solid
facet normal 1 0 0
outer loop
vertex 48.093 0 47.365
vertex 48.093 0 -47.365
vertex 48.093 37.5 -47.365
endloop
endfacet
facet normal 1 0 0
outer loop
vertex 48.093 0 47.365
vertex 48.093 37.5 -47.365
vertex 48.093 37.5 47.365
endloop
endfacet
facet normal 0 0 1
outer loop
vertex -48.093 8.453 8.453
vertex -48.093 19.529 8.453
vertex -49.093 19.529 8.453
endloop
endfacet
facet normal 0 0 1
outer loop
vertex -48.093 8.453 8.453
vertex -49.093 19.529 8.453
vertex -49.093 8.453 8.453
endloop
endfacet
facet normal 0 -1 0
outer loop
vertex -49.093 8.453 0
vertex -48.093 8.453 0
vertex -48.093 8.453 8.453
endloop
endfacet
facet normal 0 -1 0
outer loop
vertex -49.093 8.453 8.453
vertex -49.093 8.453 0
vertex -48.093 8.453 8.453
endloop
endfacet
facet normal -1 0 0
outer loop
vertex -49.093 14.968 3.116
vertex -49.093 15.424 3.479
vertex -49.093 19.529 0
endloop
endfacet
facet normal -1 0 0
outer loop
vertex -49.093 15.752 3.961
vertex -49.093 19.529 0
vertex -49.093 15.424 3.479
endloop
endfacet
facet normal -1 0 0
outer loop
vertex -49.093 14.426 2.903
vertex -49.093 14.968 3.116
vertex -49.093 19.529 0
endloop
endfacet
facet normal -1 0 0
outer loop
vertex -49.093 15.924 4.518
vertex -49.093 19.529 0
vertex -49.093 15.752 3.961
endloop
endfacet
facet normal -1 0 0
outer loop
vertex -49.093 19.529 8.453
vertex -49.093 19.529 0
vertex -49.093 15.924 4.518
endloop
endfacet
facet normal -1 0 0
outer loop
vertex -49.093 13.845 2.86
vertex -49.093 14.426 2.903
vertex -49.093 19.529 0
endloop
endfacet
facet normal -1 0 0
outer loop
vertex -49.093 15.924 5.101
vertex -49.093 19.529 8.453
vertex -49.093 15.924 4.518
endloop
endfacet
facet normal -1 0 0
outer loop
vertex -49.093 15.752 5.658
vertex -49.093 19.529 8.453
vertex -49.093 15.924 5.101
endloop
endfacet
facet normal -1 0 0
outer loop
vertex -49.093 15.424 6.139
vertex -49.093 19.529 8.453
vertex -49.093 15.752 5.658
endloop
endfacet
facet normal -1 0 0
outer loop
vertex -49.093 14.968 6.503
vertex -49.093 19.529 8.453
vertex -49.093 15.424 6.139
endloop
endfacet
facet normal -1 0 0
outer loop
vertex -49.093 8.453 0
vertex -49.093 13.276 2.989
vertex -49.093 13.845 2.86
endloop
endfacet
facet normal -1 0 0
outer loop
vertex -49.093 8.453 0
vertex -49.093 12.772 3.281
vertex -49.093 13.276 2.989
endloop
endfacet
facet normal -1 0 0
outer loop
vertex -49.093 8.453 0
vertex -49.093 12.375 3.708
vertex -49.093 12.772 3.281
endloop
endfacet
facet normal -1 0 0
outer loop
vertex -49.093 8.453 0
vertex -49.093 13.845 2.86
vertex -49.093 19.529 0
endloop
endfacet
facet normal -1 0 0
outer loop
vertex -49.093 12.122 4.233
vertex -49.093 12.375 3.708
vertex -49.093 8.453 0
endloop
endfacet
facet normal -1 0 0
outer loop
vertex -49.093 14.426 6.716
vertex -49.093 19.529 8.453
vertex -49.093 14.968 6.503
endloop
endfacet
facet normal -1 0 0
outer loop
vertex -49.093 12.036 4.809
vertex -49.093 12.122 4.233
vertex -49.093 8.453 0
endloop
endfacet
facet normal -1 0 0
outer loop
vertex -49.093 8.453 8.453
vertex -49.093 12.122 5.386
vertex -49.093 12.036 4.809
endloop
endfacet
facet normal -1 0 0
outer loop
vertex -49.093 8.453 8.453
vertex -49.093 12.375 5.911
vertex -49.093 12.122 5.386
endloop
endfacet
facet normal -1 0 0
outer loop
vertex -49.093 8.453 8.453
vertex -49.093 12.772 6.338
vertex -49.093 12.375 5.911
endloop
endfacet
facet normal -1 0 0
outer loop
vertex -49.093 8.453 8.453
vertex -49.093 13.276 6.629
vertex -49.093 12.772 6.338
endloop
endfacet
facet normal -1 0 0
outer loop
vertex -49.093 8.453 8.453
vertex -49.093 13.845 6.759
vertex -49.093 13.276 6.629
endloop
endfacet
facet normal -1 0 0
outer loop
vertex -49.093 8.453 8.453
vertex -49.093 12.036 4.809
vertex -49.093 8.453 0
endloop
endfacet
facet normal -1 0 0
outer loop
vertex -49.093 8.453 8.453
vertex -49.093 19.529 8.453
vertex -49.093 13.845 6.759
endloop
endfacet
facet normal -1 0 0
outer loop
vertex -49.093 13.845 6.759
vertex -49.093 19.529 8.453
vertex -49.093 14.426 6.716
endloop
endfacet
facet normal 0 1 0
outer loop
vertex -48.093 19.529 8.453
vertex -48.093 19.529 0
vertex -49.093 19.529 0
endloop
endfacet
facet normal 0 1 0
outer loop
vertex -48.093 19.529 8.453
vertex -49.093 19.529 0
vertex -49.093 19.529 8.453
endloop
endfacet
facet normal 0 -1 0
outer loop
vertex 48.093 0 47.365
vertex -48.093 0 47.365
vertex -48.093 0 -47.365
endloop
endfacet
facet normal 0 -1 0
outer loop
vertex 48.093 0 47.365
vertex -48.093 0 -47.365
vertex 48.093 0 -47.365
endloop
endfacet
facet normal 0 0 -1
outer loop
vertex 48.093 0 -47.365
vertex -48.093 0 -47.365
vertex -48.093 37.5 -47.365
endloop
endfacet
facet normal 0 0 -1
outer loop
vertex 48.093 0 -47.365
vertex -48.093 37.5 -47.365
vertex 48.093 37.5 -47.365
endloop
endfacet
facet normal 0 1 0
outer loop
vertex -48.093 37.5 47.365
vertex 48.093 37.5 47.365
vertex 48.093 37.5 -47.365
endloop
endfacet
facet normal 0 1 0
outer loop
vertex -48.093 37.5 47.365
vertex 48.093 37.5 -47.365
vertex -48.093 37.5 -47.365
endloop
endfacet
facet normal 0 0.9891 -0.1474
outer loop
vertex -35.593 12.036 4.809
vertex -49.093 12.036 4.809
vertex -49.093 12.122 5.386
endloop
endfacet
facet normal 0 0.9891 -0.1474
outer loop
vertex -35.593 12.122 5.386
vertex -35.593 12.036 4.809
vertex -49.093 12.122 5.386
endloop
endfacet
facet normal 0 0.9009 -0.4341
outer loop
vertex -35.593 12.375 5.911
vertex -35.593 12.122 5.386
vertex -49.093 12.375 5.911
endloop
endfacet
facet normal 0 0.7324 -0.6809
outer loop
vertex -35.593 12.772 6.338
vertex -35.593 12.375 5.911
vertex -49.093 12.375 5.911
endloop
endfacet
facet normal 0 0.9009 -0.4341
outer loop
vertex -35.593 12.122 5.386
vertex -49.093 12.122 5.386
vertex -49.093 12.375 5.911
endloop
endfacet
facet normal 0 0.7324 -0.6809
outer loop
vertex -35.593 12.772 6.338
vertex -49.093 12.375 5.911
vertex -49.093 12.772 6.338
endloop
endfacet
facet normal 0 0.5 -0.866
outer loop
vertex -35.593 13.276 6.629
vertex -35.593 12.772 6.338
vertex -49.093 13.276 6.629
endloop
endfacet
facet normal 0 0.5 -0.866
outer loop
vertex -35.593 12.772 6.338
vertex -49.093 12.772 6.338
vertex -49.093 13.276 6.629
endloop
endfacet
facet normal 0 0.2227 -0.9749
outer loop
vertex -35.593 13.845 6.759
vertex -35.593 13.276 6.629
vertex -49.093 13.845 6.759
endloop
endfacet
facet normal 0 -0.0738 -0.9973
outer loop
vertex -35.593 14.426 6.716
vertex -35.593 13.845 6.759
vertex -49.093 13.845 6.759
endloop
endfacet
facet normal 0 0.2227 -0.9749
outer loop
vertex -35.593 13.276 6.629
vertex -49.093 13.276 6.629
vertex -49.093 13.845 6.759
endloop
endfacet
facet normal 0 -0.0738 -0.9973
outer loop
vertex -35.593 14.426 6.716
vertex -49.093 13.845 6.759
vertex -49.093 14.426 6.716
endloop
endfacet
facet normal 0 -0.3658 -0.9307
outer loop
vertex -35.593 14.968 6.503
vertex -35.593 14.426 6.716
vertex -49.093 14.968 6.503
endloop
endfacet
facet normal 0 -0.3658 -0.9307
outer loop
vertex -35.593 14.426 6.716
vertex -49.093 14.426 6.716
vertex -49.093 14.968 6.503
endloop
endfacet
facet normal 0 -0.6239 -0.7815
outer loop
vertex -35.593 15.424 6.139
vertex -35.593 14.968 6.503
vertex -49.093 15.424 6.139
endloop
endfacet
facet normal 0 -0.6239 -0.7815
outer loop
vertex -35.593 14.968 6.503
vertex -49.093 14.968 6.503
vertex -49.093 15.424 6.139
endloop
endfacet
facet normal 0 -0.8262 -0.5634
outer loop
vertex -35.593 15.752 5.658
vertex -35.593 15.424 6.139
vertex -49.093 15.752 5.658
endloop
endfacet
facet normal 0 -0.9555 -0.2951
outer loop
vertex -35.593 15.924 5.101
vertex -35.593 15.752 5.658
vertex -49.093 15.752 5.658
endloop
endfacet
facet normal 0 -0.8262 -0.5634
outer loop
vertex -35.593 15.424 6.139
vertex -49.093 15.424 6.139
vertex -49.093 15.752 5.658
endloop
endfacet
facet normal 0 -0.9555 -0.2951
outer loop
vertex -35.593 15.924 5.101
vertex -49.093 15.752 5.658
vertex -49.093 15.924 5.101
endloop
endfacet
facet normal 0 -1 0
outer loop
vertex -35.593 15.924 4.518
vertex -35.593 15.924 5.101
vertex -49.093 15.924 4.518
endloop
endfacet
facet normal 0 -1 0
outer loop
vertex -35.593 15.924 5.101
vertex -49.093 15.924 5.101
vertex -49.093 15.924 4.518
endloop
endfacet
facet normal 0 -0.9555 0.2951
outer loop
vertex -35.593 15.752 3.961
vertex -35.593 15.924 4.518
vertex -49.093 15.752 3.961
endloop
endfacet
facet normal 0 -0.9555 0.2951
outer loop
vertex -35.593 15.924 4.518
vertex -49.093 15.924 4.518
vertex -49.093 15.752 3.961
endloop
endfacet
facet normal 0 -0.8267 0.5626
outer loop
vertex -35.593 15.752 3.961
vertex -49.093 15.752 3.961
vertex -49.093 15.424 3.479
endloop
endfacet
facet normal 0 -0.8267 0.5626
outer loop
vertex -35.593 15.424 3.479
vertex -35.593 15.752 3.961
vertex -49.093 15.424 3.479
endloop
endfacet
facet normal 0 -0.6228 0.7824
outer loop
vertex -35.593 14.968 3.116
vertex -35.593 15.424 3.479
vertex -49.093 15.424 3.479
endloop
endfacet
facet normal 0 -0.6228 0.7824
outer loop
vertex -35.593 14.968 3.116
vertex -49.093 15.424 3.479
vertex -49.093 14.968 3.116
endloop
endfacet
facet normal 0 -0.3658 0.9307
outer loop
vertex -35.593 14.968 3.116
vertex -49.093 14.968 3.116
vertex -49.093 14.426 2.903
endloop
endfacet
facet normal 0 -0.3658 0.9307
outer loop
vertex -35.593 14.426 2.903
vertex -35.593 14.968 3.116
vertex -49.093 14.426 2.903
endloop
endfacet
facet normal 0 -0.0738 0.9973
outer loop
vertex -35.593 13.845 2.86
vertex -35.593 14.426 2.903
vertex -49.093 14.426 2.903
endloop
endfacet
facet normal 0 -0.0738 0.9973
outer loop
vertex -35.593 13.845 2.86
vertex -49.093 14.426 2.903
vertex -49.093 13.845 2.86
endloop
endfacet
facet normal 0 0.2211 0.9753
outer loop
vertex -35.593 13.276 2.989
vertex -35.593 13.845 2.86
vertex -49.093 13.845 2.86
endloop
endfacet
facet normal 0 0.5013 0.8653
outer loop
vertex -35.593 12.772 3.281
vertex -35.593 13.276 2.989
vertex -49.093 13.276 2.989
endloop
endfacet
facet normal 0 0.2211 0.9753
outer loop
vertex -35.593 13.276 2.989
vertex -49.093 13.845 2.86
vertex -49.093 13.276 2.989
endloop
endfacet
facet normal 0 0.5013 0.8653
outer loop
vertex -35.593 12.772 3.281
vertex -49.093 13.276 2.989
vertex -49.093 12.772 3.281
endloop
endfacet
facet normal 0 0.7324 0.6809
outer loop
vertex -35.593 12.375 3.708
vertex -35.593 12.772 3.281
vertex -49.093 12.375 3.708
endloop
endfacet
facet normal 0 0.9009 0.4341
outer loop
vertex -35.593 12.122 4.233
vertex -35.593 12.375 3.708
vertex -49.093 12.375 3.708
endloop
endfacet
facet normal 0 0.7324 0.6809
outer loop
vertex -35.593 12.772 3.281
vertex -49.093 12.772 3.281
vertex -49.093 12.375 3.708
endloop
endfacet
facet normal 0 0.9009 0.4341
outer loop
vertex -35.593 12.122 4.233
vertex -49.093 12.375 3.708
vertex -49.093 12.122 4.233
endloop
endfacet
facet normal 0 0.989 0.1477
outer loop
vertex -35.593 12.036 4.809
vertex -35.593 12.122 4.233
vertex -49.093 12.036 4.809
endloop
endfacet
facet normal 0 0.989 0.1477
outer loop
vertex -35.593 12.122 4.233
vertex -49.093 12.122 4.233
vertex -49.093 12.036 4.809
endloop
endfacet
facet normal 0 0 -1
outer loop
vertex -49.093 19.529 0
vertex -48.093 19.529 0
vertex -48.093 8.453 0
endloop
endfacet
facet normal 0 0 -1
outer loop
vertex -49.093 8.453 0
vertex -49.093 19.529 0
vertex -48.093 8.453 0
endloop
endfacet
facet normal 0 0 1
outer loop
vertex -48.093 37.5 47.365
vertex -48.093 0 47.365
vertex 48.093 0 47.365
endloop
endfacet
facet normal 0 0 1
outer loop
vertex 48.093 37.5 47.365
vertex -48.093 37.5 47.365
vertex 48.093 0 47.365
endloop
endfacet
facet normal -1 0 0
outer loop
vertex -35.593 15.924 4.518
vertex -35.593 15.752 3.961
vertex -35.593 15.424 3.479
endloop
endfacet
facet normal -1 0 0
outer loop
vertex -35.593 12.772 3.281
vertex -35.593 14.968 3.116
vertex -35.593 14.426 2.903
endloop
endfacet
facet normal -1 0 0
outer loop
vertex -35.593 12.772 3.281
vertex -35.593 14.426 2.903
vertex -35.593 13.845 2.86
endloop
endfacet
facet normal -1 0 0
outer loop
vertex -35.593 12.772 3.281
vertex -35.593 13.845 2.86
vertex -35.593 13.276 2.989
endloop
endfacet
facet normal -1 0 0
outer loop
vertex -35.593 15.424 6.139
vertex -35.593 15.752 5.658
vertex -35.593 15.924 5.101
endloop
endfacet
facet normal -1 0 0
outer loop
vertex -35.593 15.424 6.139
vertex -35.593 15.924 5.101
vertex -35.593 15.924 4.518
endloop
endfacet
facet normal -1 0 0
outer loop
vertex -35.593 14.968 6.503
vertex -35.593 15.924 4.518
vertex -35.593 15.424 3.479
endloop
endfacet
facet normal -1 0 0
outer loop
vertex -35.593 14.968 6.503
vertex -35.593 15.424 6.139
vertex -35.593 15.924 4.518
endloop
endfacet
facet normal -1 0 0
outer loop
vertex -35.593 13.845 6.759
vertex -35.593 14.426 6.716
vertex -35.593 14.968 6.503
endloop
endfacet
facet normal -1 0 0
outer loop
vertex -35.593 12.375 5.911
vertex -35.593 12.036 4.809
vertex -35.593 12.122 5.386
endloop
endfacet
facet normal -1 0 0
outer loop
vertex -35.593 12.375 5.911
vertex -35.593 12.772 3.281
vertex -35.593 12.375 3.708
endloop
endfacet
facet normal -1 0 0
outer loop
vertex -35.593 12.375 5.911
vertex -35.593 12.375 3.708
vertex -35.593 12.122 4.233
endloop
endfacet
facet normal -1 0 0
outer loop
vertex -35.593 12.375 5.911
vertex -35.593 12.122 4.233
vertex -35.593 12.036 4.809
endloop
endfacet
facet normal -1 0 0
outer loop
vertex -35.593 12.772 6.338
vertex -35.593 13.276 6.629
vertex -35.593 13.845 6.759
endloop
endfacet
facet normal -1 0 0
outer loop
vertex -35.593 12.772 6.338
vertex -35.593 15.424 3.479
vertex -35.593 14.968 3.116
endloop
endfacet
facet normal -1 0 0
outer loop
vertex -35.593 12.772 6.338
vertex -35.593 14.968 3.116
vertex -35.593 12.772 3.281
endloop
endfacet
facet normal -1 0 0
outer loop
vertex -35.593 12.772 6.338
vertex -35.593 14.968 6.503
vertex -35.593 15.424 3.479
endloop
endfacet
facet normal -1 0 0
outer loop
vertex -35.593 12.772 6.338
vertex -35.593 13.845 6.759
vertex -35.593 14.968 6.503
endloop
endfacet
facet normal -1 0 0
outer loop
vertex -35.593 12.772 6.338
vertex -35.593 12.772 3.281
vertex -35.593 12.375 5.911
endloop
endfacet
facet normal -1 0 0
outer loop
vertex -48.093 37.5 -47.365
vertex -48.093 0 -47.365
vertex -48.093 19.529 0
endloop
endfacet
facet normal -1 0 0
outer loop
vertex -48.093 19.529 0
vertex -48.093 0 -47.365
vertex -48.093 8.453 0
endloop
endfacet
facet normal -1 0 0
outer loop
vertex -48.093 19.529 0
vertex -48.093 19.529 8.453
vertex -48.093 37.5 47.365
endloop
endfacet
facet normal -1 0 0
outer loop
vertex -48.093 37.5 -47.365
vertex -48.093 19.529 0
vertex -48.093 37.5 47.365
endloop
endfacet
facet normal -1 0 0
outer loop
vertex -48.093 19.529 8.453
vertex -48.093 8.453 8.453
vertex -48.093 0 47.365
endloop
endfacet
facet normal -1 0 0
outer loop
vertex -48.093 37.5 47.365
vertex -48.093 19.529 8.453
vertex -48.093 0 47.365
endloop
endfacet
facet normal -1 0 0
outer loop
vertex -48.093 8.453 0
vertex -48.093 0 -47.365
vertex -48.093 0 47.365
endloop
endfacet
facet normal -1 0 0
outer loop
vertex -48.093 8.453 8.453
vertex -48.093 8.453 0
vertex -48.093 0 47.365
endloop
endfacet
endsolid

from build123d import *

# Parameters (mm, degrees)
F0_W     = 96.186884
F0_H     = 94.729506
F1_DEPTH = 25
F2_W     = 11.076067
F2_H     = 8.452787
F3_DEPTH = 1
F4_W     = 96.186884
F4_H     = 94.729506
F5_DEPTH = 12.5
F6_R     = 1.955277
F7_DEPTH = 12.5


with BuildPart() as f1:
    # F0 (on Front) → F1 (new body)
    with BuildSketch(Plane.XZ):
        Rectangle(F0_W, F0_H)
    extrude(amount=-F1_DEPTH)

    # F2 (on face) → F3 (join)
    with BuildSketch(Plane(origin=(-48.093442, 0, 0), x_dir=(0, -1, 0), z_dir=(-1, 0, 0))):
        with Locations((-13.99082, 4.226393)):
            Rectangle(F2_W, F2_H)
    extrude(amount=F3_DEPTH)

    # F4 (on face) → F5 (join, symmetric)
    with BuildSketch(Plane(origin=(0, 25, 0), x_dir=(-1, 0, 0), z_dir=(0, 1, 0))):
        Rectangle(F4_W, F4_H)
    extrude(amount=F5_DEPTH, both=True)

    # F6 (on face) → F7 (cut, symmetric)
    with BuildSketch(Plane(origin=(-48.093442, 0, 0), x_dir=(0, -1, 0), z_dir=(-1, 0, 0))):
        with Locations((-13.99082, 4.809345)):
            Circle(F6_R)
    extrude(amount=F7_DEPTH, both=True, mode=Mode.SUBTRACT)


solid = f1.part
